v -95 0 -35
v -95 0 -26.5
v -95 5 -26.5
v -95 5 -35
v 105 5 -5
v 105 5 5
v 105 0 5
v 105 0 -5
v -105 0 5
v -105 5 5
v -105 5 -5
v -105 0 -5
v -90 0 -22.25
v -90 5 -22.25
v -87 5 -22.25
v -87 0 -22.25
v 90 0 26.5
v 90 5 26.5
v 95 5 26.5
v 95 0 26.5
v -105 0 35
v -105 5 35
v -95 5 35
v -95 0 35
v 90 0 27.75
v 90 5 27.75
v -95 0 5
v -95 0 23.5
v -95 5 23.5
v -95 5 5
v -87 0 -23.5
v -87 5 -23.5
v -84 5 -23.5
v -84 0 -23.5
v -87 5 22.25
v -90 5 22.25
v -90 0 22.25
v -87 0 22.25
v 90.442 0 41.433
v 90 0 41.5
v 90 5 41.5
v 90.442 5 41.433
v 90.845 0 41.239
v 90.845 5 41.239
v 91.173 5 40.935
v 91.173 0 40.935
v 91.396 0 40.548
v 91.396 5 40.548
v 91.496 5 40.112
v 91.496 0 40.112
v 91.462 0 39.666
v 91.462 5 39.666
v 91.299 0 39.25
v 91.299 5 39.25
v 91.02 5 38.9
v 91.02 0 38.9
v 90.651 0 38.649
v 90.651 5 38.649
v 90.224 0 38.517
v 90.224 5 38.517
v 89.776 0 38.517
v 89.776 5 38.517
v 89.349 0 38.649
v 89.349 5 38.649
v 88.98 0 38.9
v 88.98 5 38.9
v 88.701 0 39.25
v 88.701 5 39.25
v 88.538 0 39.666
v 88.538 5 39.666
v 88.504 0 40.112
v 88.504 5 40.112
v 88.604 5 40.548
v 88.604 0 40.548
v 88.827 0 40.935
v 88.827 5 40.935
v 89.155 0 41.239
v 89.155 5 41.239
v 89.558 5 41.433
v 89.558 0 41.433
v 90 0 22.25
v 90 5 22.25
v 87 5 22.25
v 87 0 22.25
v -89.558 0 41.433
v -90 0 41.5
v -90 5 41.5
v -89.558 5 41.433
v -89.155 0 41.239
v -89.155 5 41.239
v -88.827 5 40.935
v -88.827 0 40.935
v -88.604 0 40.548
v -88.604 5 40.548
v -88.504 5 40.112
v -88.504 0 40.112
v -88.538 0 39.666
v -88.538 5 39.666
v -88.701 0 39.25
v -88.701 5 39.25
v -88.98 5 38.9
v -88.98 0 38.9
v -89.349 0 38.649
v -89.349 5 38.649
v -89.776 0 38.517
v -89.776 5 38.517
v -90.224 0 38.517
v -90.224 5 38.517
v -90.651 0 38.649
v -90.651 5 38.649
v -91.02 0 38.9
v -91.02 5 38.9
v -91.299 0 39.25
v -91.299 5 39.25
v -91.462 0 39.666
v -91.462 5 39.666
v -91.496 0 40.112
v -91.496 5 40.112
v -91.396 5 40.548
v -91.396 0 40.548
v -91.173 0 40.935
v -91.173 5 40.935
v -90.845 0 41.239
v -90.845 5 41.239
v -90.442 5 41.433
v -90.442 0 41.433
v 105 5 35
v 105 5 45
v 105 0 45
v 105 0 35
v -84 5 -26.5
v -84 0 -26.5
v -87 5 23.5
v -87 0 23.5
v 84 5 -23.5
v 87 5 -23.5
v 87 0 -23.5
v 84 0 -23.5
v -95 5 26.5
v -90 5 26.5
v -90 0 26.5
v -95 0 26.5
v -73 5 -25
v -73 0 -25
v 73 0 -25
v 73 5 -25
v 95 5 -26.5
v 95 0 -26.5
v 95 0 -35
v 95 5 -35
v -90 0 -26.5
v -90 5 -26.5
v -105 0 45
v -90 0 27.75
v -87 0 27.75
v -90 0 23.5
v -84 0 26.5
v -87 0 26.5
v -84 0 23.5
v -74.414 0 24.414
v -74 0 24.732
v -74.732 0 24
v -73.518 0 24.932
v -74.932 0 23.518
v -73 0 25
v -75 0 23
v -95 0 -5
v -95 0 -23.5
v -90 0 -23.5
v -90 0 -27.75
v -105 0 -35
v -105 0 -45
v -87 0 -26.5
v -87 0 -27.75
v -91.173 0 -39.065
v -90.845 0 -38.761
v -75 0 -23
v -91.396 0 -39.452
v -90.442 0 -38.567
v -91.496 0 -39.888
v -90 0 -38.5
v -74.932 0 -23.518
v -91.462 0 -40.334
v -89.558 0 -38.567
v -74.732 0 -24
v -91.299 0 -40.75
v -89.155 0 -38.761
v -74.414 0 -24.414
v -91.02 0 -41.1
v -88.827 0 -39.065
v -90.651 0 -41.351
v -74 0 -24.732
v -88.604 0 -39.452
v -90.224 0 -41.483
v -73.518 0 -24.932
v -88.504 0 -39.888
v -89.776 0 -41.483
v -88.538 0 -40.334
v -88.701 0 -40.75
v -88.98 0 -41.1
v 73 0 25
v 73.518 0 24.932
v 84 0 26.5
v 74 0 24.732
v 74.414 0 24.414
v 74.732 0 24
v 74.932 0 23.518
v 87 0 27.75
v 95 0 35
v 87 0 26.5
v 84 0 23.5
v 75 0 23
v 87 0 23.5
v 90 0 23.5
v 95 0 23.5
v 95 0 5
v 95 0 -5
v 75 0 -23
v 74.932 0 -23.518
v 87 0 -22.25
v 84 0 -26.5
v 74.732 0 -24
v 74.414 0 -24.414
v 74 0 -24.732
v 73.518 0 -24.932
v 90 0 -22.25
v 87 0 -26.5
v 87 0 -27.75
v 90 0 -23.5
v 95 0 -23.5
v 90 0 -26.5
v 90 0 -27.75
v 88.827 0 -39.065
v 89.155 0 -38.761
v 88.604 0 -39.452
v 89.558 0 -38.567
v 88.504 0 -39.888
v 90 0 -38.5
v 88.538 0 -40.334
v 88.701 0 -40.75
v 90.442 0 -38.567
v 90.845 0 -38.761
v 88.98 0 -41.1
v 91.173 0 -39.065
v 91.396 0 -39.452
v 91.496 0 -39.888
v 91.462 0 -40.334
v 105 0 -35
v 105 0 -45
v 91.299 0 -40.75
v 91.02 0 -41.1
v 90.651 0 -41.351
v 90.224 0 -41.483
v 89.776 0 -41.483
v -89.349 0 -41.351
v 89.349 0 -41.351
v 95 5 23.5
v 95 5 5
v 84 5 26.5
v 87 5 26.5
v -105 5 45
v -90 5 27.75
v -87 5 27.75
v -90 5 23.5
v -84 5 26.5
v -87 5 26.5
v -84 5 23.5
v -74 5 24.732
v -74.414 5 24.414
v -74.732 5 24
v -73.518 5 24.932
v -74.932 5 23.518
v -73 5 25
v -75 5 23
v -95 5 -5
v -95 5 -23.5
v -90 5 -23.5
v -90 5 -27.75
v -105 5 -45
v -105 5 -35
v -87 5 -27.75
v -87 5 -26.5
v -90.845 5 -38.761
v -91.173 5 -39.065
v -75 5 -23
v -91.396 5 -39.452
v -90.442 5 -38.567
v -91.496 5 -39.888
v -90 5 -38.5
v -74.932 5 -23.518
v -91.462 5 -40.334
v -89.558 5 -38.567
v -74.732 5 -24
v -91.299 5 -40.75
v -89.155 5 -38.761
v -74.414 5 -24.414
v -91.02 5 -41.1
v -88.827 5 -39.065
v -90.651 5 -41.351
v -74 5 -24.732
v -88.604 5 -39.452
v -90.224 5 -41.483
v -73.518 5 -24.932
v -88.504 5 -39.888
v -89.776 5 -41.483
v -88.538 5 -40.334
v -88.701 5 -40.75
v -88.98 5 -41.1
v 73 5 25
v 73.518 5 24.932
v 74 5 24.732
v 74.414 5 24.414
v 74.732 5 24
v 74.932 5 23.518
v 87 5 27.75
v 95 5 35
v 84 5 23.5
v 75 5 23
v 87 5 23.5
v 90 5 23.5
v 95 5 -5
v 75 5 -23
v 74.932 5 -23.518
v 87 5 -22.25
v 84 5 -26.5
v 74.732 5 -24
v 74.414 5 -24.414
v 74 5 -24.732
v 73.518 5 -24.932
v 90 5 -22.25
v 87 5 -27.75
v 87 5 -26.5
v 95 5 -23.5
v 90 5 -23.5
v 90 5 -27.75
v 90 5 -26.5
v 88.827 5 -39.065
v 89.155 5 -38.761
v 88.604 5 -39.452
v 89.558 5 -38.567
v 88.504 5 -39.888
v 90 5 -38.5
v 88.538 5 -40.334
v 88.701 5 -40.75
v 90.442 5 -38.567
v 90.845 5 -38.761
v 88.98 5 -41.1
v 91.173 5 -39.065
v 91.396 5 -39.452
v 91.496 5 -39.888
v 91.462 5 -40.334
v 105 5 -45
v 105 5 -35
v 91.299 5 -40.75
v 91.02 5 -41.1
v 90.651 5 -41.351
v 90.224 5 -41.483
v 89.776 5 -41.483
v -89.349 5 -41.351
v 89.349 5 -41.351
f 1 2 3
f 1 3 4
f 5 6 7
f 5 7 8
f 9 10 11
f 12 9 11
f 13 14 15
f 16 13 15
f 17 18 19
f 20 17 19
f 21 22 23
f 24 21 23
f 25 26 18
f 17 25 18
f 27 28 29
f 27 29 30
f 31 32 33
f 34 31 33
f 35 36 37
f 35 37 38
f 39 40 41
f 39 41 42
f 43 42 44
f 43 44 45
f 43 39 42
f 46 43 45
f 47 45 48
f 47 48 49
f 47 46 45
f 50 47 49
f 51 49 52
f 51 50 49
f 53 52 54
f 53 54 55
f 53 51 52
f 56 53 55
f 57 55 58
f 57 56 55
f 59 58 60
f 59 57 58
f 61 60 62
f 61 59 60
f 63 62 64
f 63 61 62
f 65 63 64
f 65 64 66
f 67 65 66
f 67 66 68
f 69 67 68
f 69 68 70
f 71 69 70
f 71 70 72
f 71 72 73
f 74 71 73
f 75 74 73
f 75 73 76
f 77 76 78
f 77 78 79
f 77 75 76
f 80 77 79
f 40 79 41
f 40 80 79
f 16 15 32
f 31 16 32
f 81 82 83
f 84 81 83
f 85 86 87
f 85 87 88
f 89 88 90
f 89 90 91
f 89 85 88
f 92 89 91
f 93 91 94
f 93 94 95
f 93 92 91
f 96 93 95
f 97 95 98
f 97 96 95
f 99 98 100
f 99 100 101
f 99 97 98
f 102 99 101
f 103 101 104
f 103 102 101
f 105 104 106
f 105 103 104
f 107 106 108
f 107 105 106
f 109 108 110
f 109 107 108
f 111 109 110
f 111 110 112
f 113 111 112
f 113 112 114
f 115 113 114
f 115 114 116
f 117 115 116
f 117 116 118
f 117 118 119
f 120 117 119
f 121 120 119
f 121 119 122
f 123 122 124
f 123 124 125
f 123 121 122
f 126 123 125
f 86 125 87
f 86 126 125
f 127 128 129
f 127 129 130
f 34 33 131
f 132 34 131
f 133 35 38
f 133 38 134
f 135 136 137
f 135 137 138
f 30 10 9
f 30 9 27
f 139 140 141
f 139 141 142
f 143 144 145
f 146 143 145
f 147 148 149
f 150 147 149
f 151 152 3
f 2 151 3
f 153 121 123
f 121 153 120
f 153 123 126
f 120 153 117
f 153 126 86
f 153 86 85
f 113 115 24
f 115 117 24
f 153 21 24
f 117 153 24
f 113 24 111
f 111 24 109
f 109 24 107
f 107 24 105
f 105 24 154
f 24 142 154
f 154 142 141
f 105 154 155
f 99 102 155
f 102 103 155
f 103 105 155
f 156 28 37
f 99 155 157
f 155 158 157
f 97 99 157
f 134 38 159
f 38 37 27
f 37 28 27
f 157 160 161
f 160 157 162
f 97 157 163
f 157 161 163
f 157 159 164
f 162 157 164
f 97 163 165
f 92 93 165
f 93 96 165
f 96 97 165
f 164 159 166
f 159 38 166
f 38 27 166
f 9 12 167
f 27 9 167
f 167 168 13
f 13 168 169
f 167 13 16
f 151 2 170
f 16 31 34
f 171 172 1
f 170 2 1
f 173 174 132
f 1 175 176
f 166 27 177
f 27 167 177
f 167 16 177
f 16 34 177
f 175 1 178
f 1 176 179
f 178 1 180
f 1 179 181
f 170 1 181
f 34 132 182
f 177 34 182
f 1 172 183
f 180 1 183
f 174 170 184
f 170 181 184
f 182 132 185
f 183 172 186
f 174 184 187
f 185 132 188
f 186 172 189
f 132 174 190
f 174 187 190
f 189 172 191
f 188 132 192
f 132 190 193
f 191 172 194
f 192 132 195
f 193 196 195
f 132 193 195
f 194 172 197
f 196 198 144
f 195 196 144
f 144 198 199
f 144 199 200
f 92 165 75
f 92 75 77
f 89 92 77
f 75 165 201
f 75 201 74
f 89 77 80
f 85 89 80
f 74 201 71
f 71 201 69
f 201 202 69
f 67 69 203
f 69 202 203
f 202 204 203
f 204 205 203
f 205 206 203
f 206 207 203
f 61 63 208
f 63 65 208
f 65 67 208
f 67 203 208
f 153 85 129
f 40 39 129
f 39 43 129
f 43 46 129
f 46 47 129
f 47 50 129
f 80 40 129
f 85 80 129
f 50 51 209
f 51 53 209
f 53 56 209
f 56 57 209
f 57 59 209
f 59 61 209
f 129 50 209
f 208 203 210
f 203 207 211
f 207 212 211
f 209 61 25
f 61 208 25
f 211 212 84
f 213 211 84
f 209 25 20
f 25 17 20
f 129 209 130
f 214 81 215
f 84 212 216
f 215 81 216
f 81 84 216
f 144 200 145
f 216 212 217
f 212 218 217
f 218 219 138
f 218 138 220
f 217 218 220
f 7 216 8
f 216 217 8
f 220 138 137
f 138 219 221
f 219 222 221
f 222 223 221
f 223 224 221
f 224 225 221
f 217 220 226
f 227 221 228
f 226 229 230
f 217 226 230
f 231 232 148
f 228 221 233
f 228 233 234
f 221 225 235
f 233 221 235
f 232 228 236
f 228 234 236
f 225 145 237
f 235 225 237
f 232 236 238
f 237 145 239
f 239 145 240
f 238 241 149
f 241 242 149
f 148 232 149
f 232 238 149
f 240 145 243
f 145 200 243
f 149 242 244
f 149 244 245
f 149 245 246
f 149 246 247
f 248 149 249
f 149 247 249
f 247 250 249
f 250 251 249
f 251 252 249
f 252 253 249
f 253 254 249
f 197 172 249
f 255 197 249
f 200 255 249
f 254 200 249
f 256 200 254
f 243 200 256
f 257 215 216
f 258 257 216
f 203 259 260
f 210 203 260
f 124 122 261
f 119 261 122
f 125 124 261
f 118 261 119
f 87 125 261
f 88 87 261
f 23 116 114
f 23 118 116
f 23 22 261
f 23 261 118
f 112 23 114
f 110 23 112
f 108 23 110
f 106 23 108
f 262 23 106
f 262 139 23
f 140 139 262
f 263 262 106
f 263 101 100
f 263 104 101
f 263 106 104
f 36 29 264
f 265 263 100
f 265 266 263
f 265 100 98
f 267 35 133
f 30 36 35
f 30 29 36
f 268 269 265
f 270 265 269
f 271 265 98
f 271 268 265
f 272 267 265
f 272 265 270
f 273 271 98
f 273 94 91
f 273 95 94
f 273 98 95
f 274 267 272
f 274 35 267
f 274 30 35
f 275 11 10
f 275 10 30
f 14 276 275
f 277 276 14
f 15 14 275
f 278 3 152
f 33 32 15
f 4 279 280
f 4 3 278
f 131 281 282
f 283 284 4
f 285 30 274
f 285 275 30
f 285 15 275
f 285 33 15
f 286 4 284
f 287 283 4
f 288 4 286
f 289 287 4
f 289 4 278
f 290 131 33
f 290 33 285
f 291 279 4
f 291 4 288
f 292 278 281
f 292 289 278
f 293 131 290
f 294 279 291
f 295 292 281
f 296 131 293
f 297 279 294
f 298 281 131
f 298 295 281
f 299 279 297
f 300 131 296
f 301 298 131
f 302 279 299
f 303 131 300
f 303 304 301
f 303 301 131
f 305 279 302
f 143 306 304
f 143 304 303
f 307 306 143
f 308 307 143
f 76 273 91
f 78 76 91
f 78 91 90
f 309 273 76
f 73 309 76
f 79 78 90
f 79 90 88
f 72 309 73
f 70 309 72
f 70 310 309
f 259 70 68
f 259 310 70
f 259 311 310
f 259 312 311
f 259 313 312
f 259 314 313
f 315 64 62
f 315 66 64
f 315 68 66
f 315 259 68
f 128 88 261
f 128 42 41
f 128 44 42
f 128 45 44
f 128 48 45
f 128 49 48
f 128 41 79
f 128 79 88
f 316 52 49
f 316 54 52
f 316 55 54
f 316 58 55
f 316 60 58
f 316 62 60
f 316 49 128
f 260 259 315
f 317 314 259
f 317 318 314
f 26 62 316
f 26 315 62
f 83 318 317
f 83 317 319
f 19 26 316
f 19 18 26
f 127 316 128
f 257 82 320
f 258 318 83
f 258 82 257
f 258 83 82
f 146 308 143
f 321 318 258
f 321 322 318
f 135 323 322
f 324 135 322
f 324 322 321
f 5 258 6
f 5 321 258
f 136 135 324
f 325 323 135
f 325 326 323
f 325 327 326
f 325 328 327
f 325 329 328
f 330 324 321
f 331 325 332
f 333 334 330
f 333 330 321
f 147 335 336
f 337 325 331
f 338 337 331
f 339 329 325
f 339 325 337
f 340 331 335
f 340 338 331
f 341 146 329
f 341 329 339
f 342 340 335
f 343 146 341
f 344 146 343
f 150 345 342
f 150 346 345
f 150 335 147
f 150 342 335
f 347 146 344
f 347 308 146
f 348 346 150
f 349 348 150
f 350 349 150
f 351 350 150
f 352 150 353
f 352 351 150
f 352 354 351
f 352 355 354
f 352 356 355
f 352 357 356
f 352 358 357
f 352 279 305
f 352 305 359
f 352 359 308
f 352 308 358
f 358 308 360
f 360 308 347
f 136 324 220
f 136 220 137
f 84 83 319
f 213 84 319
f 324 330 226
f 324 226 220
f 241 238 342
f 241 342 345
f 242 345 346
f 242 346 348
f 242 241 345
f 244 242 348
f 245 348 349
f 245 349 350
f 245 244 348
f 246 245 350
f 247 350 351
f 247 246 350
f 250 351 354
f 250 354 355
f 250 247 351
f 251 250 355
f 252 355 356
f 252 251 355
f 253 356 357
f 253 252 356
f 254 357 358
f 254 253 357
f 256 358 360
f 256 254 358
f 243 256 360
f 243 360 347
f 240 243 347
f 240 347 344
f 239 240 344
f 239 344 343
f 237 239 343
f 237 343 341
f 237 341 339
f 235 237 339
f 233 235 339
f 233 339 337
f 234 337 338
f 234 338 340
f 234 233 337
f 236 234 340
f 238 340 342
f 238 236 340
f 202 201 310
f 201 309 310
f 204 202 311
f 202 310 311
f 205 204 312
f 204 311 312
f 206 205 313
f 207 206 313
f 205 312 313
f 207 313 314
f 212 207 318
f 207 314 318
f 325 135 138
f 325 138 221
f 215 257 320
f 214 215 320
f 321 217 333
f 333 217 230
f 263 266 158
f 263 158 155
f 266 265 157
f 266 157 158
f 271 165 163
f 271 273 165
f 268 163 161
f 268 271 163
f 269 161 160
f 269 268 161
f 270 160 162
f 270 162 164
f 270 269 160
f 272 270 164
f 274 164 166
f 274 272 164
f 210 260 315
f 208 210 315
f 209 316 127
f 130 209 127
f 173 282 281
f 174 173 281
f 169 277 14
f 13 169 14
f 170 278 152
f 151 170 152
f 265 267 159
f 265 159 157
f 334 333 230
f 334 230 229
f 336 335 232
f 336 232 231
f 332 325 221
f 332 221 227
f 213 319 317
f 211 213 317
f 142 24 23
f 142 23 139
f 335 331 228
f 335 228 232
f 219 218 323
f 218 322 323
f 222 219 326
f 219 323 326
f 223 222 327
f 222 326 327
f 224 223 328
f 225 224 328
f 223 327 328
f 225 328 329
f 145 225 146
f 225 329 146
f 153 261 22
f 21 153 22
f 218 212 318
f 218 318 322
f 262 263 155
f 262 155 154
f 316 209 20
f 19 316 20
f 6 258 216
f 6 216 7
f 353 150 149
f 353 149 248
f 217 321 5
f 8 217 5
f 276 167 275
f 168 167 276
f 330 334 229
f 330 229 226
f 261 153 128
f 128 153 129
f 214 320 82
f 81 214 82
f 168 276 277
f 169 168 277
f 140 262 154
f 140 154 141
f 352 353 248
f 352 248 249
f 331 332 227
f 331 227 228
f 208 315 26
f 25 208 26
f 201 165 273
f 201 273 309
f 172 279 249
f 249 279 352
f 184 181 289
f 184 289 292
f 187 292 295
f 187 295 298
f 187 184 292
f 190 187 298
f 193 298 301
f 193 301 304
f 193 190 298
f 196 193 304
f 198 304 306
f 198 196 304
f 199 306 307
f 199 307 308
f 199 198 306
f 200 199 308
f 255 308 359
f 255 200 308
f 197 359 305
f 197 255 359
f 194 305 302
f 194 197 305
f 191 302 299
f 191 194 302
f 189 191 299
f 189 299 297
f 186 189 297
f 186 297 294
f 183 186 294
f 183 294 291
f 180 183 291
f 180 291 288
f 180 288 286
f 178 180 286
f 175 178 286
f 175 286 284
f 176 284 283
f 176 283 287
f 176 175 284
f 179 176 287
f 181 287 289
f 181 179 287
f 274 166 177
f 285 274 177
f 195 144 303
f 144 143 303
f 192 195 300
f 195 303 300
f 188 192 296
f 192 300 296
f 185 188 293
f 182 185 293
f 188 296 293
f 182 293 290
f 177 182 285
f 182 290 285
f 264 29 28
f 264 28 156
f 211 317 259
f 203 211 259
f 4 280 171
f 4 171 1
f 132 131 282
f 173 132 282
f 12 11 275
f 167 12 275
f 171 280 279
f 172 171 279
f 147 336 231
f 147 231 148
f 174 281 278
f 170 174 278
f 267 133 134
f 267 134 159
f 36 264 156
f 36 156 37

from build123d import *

# Parameters (mm, degrees)
SKETCH1_W           = 190
SKETCH1_H           = 90
SKETCH1_R           = 1.5
SKETCH1_W_2         = 150
SKETCH1_H_2         = 50
BOSS_EXTRUDE1_DEPTH = 5
FILLET1_R           = 2
CUT_EXTRUDE1_DEPTH  = 106.237825899
SKETCH3_W           = 10
SKETCH3_H           = 10
BOSS_EXTRUDE2_DEPTH = 5


with BuildPart() as part:
    # Sketch1 → Boss-Extrude1 (new body)
    with BuildSketch(Plane(origin=(0, 0, 0), x_dir=(1, 0, 0), z_dir=(0, 1, 0))):
        Rectangle(SKETCH1_W, SKETCH1_H)
        with Locations(Location((-90, 40, 0), (0, 0, 270))):
            Circle(SKETCH1_R, mode=Mode.SUBTRACT)
        with Locations(Location((-90, -40, 0), (0, 0, 270))):
            Circle(SKETCH1_R, mode=Mode.SUBTRACT)
        with Locations(Location((90, 40, 0), (0, 0, 270))):
            Circle(SKETCH1_R, mode=Mode.SUBTRACT)
        with Locations(Location((90, -40, 0), (0, 0, 270))):
            Circle(SKETCH1_R, mode=Mode.SUBTRACT)
        Rectangle(SKETCH1_W_2, SKETCH1_H_2, mode=Mode.SUBTRACT)
    extrude(amount=BOSS_EXTRUDE1_DEPTH)

    # Fillet1
    fillet1_edges = [part.edges().sort_by_distance(p)[0] for p in [
        (-75, 2.5, -25),
        (-75, 2.5, 25),
        (75, 2.5, 25),
        (75, 2.5, -25),
    ]]
    fillet(fillet1_edges, radius=FILLET1_R)

    # Sketch2 → Cut-Extrude1 (cut, through all)
    with BuildSketch(Plane(origin=(0, 5, 0), x_dir=(1, 0, 0), z_dir=(0, 1, 0))):
        Polygon((95, -23.5), (90, -23.5), (90, -22.25), (87, -22.25), (87, -23.5), (84, -23.5), (84, -26.5), (87, -26.5), (87, -27.75), (90, -27.75), (90, -26.5), (95, -26.5), align=None)
        Polygon((95, 26.5), (95, 23.5), (90, 23.5), (90, 22.25), (87, 22.25), (87, 23.5), (84, 23.5), (84, 26.5), (87, 26.5), (87, 27.75), (90, 27.75), (90, 26.5), align=None)
        Polygon((-95, 23.5), (-90, 23.5), (-90, 22.25), (-87, 22.25), (-87, 23.5), (-84, 23.5), (-84, 26.5), (-87, 26.5), (-87, 27.75), (-90, 27.75), (-90, 26.5), (-95, 26.5), align=None)
        Polygon((-95, -26.5), (-95, -23.5), (-90, -23.5), (-90, -22.25), (-87, -22.25), (-87, -23.5), (-84, -23.5), (-84, -26.5), (-87, -26.5), (-87, -27.75), (-90, -27.75), (-90, -26.5), align=None)
    extrude(amount=-CUT_EXTRUDE1_DEPTH, mode=Mode.SUBTRACT)

    # Sketch3 → Boss-Extrude2 (add)
    with BuildSketch(Plane(origin=(0, 5, 0), x_dir=(1, 0, 0), z_dir=(0, 1, 0))):
        with Locations((100, 40)):
            Rectangle(SKETCH3_W, SKETCH3_H)
        with Locations((100, 0)):
            Rectangle(SKETCH3_W, SKETCH3_H)
        with Locations((100, -40)):
            Rectangle(SKETCH3_W, SKETCH3_H)
        with Locations((-100, -40)):
            Rectangle(SKETCH3_W, SKETCH3_H)
        with Locations((-100, 0)):
            Rectangle(SKETCH3_W, SKETCH3_H)
        with Locations((-100, 40)):
            Rectangle(SKETCH3_W, SKETCH3_H)
    extrude(amount=-BOSS_EXTRUDE2_DEPTH)


solid = part.part
